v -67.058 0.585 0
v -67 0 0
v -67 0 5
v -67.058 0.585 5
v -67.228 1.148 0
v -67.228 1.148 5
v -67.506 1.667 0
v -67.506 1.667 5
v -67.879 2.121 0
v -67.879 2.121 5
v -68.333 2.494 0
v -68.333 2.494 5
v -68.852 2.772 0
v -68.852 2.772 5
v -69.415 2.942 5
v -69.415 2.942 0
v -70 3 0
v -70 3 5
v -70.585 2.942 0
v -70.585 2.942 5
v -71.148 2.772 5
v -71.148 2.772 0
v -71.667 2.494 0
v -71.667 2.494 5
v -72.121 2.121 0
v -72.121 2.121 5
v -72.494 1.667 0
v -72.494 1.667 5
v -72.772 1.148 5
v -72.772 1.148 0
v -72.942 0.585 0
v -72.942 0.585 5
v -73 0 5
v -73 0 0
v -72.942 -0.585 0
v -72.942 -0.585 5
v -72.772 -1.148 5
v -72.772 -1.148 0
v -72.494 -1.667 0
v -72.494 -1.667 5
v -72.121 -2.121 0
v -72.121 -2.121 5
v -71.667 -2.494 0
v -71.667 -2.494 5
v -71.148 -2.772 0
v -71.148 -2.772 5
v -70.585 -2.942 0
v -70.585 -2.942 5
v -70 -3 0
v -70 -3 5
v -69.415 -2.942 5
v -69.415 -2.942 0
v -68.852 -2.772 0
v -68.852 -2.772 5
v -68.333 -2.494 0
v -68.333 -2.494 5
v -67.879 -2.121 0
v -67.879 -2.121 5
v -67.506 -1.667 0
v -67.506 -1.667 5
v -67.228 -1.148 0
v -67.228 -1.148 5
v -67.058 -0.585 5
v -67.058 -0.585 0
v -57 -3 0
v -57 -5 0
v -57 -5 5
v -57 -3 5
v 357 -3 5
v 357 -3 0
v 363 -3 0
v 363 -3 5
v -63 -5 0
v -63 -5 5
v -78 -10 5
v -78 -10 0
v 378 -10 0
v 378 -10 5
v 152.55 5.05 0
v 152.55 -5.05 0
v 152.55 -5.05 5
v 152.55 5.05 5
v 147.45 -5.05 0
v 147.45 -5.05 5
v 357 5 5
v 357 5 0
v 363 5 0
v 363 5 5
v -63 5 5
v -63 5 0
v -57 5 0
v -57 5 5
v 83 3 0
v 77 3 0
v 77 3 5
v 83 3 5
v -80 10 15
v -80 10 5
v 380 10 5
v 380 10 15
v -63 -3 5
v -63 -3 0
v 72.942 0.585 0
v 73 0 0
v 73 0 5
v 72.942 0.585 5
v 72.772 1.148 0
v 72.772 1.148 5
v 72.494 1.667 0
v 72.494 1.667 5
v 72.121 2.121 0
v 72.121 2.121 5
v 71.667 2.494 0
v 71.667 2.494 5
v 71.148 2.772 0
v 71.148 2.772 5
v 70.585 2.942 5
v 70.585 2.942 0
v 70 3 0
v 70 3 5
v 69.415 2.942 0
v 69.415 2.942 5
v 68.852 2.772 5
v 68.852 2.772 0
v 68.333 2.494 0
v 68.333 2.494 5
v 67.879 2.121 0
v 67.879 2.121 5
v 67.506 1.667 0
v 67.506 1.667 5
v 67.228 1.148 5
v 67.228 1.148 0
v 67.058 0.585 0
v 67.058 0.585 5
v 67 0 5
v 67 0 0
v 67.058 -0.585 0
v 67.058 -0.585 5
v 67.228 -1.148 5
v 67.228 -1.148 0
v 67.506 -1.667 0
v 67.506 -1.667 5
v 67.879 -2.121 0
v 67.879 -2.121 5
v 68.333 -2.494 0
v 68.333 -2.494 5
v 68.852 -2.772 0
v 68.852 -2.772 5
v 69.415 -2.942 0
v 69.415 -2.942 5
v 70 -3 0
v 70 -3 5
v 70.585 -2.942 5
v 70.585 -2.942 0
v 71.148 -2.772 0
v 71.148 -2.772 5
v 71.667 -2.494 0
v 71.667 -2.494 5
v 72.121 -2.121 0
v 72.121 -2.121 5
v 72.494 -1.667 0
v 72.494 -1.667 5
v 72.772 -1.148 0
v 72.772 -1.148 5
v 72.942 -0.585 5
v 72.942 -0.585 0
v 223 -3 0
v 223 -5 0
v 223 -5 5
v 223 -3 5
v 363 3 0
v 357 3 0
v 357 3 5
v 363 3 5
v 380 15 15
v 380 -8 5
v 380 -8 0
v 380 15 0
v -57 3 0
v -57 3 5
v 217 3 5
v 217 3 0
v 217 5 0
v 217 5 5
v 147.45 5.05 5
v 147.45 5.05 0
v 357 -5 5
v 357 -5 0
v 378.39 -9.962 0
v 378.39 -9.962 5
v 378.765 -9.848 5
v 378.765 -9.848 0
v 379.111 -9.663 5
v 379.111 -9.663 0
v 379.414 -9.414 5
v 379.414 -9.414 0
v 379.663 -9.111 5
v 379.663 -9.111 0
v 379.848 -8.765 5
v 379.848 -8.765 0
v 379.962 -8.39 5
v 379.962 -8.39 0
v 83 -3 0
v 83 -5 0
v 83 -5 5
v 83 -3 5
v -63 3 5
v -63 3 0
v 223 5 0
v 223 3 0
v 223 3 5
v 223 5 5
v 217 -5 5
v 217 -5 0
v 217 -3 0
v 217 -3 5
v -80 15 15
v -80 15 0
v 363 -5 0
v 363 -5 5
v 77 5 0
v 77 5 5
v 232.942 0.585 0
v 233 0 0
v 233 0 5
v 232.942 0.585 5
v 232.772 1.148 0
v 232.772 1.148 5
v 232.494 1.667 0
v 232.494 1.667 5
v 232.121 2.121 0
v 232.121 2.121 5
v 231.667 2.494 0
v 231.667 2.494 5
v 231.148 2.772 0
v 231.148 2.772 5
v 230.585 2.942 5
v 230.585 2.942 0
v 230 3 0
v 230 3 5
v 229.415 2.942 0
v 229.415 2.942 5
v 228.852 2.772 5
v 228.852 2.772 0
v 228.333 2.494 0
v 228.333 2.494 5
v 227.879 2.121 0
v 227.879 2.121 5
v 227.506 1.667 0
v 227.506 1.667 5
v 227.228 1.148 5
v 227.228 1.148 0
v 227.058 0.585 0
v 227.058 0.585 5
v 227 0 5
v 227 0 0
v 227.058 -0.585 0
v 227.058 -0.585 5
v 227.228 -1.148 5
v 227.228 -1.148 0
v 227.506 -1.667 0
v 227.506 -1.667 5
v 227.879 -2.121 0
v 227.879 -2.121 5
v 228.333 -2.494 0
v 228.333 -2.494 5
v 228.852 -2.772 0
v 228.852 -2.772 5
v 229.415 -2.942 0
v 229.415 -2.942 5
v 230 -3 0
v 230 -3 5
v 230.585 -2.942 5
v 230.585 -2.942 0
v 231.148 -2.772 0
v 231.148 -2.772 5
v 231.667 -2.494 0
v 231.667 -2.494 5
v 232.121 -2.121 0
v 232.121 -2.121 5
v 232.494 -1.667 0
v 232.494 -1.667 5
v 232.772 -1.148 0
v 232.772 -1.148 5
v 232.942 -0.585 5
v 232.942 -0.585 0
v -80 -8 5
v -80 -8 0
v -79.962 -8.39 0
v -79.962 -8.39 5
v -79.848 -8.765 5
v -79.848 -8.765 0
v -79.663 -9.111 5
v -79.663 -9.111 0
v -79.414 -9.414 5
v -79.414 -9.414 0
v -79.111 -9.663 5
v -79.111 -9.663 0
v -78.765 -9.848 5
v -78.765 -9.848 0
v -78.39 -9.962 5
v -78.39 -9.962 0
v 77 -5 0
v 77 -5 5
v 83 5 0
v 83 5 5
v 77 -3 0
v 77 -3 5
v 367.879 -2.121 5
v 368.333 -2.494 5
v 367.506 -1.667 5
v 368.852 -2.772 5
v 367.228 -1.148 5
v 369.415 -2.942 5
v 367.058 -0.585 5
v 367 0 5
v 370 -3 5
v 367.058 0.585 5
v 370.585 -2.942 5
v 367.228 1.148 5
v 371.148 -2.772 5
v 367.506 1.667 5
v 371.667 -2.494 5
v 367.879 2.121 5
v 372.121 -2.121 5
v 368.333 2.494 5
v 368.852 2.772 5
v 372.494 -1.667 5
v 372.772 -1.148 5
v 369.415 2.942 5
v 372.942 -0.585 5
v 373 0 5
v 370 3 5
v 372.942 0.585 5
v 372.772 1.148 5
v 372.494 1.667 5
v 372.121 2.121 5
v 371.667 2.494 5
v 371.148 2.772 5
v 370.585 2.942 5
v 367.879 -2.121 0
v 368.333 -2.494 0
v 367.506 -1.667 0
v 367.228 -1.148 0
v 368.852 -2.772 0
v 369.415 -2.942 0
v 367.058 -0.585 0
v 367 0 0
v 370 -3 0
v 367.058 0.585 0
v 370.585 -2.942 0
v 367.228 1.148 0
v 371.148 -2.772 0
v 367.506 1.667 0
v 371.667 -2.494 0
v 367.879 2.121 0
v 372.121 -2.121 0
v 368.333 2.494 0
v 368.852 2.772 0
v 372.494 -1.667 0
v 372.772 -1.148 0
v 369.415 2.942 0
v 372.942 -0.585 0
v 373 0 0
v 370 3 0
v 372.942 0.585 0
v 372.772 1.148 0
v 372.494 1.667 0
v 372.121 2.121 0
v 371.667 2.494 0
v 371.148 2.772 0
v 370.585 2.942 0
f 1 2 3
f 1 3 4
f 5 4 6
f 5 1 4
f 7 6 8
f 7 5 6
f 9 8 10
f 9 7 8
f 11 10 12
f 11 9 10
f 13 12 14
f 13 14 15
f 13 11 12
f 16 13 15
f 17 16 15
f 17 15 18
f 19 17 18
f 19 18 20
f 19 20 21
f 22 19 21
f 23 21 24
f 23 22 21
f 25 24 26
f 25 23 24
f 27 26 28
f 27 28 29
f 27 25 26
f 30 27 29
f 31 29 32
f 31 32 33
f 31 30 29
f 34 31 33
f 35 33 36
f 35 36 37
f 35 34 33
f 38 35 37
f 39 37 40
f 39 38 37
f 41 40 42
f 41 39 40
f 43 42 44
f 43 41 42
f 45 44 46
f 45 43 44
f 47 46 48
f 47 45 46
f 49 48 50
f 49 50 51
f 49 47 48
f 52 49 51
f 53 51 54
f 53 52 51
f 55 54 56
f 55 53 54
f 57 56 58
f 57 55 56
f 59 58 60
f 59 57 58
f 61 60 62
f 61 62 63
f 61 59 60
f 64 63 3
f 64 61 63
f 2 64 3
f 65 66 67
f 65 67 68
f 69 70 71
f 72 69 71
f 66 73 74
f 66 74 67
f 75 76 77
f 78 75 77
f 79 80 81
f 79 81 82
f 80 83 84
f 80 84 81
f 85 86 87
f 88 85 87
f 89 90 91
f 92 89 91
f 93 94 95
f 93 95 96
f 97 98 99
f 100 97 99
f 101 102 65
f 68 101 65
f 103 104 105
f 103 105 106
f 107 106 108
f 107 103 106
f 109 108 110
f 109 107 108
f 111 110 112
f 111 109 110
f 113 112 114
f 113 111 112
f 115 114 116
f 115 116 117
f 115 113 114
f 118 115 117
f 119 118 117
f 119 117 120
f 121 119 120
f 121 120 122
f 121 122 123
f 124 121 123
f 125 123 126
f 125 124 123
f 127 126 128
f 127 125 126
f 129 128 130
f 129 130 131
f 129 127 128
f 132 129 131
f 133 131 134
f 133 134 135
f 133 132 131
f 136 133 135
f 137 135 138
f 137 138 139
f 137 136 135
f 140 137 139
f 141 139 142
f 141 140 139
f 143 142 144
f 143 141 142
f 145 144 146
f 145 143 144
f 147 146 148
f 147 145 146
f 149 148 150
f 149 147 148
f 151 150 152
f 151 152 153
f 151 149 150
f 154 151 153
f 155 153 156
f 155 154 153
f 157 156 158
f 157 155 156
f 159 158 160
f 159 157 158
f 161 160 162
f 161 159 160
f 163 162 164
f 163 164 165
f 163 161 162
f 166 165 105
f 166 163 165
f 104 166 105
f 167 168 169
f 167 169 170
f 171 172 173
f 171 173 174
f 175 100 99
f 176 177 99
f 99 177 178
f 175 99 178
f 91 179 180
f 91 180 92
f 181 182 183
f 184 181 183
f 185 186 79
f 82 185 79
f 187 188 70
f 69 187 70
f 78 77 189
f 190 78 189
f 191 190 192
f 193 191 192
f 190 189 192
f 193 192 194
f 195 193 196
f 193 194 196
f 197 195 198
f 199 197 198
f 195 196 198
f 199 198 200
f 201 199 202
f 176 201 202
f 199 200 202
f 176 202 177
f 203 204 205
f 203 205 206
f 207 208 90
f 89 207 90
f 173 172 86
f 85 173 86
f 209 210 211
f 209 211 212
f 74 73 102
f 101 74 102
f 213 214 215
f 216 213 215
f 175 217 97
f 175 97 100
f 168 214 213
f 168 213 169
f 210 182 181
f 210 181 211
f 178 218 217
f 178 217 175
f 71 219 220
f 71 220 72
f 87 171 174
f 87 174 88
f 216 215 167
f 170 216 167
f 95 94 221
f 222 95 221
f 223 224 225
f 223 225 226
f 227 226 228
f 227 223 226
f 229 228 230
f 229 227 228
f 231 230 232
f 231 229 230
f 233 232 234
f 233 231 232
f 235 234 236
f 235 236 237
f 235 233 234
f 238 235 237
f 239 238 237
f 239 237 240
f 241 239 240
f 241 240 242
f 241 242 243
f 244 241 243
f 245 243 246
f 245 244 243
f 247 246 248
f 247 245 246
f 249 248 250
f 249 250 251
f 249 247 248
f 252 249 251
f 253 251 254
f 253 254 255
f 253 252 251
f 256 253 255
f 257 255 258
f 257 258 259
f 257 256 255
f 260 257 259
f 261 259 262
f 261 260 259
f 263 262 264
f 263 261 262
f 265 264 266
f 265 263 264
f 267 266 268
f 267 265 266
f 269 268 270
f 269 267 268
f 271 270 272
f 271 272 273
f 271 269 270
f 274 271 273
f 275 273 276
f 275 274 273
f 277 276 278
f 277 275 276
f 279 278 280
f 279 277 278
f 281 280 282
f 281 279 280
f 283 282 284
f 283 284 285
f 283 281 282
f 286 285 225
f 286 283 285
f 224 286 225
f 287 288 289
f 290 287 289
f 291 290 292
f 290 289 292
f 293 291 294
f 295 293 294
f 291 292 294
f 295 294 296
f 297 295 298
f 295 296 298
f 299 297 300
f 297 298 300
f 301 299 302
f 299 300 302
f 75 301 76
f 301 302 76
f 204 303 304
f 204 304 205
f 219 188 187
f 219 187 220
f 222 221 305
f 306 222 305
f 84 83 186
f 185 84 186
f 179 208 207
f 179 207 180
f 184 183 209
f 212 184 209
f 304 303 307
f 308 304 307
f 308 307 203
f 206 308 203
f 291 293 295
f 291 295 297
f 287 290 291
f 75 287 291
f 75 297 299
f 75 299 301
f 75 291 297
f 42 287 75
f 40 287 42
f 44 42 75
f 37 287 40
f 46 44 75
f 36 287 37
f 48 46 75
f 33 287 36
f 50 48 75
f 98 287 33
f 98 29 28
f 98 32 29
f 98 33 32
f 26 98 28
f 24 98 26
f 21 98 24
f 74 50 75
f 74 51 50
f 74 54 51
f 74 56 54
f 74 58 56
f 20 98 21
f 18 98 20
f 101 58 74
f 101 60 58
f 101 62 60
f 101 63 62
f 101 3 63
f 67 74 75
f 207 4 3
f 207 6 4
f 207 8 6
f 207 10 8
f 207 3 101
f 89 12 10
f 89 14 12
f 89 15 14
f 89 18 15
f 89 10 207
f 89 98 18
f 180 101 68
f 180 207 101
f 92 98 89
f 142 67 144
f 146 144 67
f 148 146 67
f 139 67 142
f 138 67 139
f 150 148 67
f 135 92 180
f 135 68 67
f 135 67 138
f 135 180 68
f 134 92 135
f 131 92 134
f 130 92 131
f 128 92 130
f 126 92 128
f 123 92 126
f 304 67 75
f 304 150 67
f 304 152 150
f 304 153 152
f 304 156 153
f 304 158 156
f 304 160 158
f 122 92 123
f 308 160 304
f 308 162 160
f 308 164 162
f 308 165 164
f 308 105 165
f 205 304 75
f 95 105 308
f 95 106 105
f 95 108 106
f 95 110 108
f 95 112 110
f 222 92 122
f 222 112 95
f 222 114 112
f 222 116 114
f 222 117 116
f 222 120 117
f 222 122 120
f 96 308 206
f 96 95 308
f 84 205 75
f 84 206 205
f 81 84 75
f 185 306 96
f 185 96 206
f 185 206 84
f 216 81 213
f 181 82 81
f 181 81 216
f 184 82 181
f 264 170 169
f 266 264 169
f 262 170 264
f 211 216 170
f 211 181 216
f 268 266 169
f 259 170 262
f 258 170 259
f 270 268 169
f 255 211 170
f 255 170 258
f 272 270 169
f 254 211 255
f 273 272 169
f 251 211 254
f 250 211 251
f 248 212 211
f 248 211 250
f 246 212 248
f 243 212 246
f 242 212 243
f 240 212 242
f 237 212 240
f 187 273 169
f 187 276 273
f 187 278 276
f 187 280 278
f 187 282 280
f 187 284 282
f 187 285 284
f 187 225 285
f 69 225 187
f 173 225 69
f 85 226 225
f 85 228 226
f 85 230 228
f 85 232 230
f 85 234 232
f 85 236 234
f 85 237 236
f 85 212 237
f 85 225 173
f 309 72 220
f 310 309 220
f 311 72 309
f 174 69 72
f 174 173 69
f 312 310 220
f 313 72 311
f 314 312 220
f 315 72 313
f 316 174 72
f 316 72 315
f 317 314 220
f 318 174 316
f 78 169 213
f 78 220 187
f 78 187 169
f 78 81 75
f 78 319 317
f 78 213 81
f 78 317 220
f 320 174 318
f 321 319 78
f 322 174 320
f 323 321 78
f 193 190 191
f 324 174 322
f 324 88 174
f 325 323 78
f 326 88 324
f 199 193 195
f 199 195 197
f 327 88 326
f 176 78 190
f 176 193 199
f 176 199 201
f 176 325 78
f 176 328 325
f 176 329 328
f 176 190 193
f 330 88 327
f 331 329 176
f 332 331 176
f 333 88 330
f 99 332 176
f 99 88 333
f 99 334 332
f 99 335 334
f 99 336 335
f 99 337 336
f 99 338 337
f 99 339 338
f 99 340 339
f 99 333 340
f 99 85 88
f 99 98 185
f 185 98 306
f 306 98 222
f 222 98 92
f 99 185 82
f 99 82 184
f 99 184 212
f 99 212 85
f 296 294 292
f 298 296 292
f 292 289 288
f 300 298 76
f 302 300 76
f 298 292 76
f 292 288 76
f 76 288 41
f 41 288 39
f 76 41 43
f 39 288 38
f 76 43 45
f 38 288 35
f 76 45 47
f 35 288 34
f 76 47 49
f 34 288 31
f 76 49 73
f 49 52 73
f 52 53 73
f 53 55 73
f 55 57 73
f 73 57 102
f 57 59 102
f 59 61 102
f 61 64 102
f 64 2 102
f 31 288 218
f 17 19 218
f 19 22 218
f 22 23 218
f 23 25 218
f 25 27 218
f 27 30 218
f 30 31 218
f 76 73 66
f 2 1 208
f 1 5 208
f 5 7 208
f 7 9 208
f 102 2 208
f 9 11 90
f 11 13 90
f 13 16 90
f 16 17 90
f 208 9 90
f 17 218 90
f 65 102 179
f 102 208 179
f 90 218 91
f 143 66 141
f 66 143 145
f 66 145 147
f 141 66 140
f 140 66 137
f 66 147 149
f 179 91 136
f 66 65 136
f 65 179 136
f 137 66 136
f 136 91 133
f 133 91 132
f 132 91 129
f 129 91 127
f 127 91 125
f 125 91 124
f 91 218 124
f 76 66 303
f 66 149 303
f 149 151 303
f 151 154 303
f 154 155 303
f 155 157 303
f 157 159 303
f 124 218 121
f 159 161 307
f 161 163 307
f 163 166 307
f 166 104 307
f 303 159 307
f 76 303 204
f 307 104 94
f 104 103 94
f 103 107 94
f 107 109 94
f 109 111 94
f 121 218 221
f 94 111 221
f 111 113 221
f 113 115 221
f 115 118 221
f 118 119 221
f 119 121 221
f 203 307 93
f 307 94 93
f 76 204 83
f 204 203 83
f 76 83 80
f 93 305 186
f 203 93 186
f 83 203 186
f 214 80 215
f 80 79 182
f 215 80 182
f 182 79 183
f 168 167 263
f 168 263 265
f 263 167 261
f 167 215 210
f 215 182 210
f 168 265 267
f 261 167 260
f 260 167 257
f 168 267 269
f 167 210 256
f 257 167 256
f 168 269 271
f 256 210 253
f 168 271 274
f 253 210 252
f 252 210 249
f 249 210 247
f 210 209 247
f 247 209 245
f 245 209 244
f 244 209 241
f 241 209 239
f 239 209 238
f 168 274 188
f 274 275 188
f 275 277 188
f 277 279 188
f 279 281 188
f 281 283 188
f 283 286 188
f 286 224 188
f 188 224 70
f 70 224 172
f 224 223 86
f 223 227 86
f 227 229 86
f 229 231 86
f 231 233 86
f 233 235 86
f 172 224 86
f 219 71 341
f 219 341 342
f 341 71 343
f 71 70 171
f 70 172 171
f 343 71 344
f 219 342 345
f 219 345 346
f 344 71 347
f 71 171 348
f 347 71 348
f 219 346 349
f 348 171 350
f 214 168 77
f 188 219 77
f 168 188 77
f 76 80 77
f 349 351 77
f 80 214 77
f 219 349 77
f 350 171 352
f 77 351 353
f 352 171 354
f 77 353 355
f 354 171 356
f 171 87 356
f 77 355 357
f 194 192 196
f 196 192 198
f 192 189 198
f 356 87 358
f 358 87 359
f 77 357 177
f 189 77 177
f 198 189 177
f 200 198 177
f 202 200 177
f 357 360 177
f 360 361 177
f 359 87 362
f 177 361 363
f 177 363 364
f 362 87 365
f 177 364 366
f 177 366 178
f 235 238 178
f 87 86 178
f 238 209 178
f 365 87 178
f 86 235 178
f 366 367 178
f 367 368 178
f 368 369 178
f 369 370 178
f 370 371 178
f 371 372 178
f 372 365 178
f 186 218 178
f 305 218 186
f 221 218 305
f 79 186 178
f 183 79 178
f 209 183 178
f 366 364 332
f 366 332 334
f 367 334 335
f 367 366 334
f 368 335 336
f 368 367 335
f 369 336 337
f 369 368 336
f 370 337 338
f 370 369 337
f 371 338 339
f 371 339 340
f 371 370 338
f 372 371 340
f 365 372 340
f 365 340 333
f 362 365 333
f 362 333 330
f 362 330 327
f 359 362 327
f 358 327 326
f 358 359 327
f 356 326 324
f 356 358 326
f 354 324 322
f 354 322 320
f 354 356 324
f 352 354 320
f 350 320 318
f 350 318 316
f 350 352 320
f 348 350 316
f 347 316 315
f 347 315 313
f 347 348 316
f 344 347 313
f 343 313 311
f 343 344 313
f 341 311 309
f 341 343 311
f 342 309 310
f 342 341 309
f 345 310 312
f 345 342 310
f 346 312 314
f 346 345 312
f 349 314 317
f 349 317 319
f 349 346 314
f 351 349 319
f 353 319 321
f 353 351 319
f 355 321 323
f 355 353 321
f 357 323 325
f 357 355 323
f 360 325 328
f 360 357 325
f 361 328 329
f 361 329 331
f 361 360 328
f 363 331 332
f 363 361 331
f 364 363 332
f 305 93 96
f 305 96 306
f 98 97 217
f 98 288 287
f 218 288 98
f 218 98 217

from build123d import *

# Parameters (mm, degrees)
F0_W     = 6
F0_H     = 2
F0_R     = 3
F0_W_2   = 5.1
F0_H_2   = 10.1
F1_DEPTH = 5
F0_W_3   = 460
F0_H_3   = 5
F2_DEPTH = 15


with BuildPart() as f1:
    # F0 (on Top) → F1 (new body)
    with BuildSketch(Plane.XY):
        with BuildLine():
            ThreePointArc((-80, -8), (-79.414214, -9.414214), (-78, -10))
            Line((-78, -10), (378, -10))
            ThreePointArc((378, -10), (379.414214, -9.414214), (380, -8))
            Line((380, -8), (380, 10))
            Line((380, 10), (-80, 10))
            Line((-80, 10), (-80, -8))
        make_face()
        with Locations((-60, -4)):
            Rectangle(F0_W, F0_H, mode=Mode.SUBTRACT)
        with Locations((80, -4)):
            Rectangle(F0_W, F0_H, mode=Mode.SUBTRACT)
        with Locations((-70, 0)):
            Circle(F0_R, mode=Mode.SUBTRACT)
        with Locations((70, 0)):
            Circle(F0_R, mode=Mode.SUBTRACT)
        with Locations((220, -4)):
            Rectangle(F0_W, F0_H, mode=Mode.SUBTRACT)
        with Locations((360, -4)):
            Rectangle(F0_W, F0_H, mode=Mode.SUBTRACT)
        with Locations((150, 0)):
            Rectangle(F0_W_2, F0_H_2, mode=Mode.SUBTRACT)
        with Locations((230, 0)):
            Circle(F0_R, mode=Mode.SUBTRACT)
        with Locations((370, 0)):
            Circle(F0_R, mode=Mode.SUBTRACT)
        with Locations((-60, 4)):
            Rectangle(F0_W, F0_H, mode=Mode.SUBTRACT)
        with Locations((80, 4)):
            Rectangle(F0_W, F0_H, mode=Mode.SUBTRACT)
        with Locations((220, 4)):
            Rectangle(F0_W, F0_H, mode=Mode.SUBTRACT)
        with Locations((360, 4)):
            Rectangle(F0_W, F0_H, mode=Mode.SUBTRACT)
    extrude(amount=F1_DEPTH)

    # F0 (on Top) → F2 (join)
    with BuildSketch(Plane.XY):
        with Locations((150, 12.5)):
            Rectangle(F0_W_3, F0_H_3)
    extrude(amount=F2_DEPTH)


solid = f1.part
